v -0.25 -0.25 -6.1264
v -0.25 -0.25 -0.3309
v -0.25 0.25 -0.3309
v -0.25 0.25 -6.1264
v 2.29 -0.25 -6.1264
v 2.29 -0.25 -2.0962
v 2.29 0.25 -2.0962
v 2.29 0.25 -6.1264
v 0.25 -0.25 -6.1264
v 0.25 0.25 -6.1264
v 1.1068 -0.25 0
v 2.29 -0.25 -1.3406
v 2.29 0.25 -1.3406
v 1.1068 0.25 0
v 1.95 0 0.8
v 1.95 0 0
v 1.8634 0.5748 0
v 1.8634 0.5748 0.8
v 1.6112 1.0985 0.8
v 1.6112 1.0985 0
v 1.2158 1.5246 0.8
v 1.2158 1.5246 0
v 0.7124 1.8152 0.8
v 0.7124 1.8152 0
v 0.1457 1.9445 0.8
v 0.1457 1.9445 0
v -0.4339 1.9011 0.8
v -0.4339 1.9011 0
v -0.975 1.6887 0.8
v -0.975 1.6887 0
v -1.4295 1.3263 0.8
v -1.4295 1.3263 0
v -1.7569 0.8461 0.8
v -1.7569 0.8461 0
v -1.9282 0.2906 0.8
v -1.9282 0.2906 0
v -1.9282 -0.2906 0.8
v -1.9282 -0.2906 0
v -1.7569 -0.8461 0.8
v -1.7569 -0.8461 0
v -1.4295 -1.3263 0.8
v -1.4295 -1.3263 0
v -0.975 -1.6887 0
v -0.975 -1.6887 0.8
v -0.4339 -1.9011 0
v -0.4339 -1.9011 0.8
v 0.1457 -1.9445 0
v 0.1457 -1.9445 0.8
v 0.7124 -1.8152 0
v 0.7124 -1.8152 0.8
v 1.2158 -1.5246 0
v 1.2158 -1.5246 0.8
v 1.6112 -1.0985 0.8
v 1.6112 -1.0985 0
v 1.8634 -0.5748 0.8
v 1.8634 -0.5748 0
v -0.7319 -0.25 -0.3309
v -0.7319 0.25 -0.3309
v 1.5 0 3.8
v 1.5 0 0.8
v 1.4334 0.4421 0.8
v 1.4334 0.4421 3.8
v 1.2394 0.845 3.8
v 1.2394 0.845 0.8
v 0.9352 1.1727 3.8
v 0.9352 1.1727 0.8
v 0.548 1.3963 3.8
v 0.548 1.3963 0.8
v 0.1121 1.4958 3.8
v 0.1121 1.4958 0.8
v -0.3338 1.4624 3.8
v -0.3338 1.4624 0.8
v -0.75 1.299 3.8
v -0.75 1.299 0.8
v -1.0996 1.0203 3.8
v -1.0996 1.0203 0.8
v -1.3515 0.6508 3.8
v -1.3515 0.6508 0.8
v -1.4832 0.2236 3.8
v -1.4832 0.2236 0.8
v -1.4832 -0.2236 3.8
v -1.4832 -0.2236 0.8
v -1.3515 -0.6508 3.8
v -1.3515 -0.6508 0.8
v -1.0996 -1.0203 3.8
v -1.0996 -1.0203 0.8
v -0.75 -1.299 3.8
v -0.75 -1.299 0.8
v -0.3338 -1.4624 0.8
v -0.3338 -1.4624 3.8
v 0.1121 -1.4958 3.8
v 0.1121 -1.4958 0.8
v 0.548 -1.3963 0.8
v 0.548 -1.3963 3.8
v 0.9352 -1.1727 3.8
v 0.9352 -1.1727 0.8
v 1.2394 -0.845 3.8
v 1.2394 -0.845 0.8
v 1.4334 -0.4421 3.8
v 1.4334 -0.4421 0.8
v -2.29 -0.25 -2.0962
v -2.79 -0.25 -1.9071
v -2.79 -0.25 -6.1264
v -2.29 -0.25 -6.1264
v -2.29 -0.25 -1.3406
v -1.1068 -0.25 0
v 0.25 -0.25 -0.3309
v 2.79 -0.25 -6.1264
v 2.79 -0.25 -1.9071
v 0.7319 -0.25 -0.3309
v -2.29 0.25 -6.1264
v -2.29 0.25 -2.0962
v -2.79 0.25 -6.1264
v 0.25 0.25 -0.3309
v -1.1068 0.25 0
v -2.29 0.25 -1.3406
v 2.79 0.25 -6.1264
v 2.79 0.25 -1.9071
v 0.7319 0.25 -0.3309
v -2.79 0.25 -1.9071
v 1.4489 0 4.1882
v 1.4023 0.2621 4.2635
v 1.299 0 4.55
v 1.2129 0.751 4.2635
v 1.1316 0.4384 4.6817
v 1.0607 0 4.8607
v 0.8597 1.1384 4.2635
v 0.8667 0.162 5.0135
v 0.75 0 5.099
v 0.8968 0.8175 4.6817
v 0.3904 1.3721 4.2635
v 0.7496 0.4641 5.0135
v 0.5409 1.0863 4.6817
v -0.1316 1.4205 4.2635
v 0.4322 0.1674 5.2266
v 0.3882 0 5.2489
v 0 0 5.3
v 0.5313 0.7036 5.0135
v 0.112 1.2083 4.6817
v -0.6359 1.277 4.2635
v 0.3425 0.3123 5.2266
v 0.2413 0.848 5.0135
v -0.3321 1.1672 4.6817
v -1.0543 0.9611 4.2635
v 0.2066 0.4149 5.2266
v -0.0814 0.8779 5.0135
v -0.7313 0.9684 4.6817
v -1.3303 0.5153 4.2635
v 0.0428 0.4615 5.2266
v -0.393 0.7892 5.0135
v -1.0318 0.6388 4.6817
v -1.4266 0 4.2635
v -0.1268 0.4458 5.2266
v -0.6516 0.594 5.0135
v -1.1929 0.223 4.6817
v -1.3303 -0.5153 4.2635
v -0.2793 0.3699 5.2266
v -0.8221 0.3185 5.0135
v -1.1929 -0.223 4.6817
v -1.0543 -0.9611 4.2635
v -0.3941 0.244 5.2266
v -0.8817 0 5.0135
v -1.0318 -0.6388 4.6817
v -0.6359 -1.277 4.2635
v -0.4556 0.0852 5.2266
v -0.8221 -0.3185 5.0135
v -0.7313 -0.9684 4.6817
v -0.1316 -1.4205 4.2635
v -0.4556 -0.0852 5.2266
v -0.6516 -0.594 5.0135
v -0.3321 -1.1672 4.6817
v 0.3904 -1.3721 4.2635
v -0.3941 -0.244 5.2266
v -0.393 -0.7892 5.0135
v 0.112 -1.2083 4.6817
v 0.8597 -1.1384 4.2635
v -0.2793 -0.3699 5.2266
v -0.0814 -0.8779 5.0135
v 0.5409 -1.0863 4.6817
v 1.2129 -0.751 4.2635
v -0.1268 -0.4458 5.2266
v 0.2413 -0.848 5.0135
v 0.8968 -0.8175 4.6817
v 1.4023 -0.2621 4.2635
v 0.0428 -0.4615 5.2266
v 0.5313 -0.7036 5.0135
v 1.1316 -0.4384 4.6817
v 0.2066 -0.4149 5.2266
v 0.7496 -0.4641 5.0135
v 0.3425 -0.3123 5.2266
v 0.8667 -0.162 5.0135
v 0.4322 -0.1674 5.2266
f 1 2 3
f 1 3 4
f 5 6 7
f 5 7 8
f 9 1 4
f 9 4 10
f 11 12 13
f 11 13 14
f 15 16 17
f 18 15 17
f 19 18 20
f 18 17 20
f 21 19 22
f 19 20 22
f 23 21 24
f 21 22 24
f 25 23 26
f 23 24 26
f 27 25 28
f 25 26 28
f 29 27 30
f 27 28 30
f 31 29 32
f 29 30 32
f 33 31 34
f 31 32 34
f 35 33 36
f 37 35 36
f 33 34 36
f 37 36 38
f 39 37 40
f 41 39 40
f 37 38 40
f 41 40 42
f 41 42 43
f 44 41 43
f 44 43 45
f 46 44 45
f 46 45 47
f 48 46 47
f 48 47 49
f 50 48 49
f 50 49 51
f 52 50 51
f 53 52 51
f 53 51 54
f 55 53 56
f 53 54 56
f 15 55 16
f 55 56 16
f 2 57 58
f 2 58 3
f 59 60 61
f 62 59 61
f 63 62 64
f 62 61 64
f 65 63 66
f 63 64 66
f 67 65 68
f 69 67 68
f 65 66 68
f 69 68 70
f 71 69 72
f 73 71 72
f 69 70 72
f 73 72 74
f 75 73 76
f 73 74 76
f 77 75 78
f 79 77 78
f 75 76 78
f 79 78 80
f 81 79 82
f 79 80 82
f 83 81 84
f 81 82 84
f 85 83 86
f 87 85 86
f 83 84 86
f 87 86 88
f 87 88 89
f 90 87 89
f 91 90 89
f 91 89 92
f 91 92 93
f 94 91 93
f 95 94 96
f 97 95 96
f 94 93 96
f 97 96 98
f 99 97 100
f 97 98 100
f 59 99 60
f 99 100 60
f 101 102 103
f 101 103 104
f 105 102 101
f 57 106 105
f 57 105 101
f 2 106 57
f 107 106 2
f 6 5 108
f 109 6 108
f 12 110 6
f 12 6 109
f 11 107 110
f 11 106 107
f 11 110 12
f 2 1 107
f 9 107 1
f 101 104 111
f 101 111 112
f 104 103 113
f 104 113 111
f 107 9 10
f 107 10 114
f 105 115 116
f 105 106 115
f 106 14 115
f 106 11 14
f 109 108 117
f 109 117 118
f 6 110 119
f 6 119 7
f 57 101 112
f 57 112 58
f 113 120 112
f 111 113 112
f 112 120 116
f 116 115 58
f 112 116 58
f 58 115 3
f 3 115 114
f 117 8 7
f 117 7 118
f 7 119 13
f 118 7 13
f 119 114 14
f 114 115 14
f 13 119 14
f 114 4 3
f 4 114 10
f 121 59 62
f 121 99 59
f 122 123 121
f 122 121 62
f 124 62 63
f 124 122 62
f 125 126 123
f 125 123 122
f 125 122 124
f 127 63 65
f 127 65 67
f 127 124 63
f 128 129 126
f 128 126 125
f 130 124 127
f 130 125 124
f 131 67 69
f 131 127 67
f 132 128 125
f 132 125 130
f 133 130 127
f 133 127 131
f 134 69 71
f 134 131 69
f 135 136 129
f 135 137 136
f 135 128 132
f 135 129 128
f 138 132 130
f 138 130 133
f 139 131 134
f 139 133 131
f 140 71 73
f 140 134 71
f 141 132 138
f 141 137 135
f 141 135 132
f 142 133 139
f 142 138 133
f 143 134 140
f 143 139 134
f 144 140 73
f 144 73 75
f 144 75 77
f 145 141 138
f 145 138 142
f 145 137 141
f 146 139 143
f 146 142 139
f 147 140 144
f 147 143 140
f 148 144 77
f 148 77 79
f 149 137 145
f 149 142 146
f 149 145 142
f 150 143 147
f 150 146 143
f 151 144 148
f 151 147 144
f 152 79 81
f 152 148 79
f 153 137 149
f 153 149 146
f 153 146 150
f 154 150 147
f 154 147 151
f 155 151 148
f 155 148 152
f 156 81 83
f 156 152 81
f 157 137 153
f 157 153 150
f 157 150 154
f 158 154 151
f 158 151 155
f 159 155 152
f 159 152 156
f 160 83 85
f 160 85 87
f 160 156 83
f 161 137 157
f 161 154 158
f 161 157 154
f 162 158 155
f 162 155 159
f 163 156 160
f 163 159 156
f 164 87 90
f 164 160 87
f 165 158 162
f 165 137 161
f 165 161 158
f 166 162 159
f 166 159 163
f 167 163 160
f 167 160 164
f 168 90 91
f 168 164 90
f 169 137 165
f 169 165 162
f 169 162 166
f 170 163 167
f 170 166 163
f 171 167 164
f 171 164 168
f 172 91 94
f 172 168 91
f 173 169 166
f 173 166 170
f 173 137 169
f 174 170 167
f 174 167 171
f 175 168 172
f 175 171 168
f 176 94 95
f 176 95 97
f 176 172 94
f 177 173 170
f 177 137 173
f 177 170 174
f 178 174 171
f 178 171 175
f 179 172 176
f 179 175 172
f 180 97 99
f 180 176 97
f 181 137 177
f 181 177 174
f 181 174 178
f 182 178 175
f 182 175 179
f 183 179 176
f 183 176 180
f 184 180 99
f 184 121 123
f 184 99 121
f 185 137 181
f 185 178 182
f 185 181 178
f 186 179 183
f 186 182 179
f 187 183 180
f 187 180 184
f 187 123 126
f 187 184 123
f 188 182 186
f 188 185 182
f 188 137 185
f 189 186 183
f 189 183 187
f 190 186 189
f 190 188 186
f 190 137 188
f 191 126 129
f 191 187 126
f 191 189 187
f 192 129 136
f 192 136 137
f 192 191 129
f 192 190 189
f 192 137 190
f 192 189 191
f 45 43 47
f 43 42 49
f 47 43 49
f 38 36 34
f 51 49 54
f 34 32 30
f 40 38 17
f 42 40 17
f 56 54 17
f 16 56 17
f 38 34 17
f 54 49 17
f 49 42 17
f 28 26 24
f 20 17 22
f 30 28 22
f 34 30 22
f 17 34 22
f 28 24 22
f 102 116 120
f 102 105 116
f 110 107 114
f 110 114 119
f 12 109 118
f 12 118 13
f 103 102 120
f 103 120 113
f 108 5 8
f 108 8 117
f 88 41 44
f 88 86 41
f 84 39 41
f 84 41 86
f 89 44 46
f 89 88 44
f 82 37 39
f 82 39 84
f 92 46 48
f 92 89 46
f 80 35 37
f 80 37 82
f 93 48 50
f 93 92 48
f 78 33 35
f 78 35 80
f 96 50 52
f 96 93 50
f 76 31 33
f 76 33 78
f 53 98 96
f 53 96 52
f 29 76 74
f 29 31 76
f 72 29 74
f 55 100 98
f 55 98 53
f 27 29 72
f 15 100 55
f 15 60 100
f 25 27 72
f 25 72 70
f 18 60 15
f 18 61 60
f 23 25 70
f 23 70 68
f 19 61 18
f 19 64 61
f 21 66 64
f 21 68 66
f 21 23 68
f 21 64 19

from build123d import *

# Parameters (mm, degrees)
F0_R          = 1.95
F1_DEPTH      = 0.8
F2_R          = 1.5
F3_DEPTH      = 4.5
F4_R          = 1.5
F6_DEPTH      = 0.25
F6_DEPTH_BACK = 0.25


with BuildPart() as f1:
    # F0 (on Top) → F1 (new body)
    with BuildSketch(Plane.XY):
        Circle(F0_R)
    extrude(amount=F1_DEPTH)

    # F2 (on face) → F3 (join)
    with BuildSketch(Plane.XY.offset(0.8)):
        Circle(F2_R)
    extrude(amount=F3_DEPTH)

    # F4
    f4_edges = [f1.edges().sort_by_distance(p)[0] for p in [
        (-1.5, 0, 5.3),
    ]]
    fillet(f4_edges, radius=F4_R)


with BuildPart() as f6:
    # F5 (on Front) → F6 (new body, two sides)
    with BuildSketch(Plane.XZ) as f6_sk:
        Polygon((-2.29, -1.340597), (-2.54, -1.623856), (-2.54, -6.126423), (-2.29, -6.126423), (-2.29, -2.096204), align=None)
        Polygon((-2.54, -6.126423), (-2.54, -1.623856), (-2.79, -1.907115), (-2.79, -6.126423), align=None)
        Polygon((-1.106809, 0), (-2.29, -1.340597), (-2.29, -2.096204), (-0.731933, -0.33086), (-0.25, -0.33086), (0.25, -0.33086), (0.731933, -0.33086), (2.29, -2.096204), (2.29, -1.340597), (1.106809, 0), align=None)
        Polygon((0.25, -0.33086), (-0.25, -0.33086), (-0.25, -6.126423), (0, -6.126423), (0.25, -6.126423), align=None)
        Polygon((2.54, -1.623856), (2.29, -1.340597), (2.29, -2.096204), (2.29, -6.126423), (2.54, -6.126423), align=None)
        Polygon((2.79, -1.907115), (2.54, -1.623856), (2.54, -6.126423), (2.79, -6.126423), align=None)
    extrude(amount=F6_DEPTH)
    extrude(f6_sk.sketch, amount=-F6_DEPTH_BACK)


solid = Compound([f1.part, f6.part])
